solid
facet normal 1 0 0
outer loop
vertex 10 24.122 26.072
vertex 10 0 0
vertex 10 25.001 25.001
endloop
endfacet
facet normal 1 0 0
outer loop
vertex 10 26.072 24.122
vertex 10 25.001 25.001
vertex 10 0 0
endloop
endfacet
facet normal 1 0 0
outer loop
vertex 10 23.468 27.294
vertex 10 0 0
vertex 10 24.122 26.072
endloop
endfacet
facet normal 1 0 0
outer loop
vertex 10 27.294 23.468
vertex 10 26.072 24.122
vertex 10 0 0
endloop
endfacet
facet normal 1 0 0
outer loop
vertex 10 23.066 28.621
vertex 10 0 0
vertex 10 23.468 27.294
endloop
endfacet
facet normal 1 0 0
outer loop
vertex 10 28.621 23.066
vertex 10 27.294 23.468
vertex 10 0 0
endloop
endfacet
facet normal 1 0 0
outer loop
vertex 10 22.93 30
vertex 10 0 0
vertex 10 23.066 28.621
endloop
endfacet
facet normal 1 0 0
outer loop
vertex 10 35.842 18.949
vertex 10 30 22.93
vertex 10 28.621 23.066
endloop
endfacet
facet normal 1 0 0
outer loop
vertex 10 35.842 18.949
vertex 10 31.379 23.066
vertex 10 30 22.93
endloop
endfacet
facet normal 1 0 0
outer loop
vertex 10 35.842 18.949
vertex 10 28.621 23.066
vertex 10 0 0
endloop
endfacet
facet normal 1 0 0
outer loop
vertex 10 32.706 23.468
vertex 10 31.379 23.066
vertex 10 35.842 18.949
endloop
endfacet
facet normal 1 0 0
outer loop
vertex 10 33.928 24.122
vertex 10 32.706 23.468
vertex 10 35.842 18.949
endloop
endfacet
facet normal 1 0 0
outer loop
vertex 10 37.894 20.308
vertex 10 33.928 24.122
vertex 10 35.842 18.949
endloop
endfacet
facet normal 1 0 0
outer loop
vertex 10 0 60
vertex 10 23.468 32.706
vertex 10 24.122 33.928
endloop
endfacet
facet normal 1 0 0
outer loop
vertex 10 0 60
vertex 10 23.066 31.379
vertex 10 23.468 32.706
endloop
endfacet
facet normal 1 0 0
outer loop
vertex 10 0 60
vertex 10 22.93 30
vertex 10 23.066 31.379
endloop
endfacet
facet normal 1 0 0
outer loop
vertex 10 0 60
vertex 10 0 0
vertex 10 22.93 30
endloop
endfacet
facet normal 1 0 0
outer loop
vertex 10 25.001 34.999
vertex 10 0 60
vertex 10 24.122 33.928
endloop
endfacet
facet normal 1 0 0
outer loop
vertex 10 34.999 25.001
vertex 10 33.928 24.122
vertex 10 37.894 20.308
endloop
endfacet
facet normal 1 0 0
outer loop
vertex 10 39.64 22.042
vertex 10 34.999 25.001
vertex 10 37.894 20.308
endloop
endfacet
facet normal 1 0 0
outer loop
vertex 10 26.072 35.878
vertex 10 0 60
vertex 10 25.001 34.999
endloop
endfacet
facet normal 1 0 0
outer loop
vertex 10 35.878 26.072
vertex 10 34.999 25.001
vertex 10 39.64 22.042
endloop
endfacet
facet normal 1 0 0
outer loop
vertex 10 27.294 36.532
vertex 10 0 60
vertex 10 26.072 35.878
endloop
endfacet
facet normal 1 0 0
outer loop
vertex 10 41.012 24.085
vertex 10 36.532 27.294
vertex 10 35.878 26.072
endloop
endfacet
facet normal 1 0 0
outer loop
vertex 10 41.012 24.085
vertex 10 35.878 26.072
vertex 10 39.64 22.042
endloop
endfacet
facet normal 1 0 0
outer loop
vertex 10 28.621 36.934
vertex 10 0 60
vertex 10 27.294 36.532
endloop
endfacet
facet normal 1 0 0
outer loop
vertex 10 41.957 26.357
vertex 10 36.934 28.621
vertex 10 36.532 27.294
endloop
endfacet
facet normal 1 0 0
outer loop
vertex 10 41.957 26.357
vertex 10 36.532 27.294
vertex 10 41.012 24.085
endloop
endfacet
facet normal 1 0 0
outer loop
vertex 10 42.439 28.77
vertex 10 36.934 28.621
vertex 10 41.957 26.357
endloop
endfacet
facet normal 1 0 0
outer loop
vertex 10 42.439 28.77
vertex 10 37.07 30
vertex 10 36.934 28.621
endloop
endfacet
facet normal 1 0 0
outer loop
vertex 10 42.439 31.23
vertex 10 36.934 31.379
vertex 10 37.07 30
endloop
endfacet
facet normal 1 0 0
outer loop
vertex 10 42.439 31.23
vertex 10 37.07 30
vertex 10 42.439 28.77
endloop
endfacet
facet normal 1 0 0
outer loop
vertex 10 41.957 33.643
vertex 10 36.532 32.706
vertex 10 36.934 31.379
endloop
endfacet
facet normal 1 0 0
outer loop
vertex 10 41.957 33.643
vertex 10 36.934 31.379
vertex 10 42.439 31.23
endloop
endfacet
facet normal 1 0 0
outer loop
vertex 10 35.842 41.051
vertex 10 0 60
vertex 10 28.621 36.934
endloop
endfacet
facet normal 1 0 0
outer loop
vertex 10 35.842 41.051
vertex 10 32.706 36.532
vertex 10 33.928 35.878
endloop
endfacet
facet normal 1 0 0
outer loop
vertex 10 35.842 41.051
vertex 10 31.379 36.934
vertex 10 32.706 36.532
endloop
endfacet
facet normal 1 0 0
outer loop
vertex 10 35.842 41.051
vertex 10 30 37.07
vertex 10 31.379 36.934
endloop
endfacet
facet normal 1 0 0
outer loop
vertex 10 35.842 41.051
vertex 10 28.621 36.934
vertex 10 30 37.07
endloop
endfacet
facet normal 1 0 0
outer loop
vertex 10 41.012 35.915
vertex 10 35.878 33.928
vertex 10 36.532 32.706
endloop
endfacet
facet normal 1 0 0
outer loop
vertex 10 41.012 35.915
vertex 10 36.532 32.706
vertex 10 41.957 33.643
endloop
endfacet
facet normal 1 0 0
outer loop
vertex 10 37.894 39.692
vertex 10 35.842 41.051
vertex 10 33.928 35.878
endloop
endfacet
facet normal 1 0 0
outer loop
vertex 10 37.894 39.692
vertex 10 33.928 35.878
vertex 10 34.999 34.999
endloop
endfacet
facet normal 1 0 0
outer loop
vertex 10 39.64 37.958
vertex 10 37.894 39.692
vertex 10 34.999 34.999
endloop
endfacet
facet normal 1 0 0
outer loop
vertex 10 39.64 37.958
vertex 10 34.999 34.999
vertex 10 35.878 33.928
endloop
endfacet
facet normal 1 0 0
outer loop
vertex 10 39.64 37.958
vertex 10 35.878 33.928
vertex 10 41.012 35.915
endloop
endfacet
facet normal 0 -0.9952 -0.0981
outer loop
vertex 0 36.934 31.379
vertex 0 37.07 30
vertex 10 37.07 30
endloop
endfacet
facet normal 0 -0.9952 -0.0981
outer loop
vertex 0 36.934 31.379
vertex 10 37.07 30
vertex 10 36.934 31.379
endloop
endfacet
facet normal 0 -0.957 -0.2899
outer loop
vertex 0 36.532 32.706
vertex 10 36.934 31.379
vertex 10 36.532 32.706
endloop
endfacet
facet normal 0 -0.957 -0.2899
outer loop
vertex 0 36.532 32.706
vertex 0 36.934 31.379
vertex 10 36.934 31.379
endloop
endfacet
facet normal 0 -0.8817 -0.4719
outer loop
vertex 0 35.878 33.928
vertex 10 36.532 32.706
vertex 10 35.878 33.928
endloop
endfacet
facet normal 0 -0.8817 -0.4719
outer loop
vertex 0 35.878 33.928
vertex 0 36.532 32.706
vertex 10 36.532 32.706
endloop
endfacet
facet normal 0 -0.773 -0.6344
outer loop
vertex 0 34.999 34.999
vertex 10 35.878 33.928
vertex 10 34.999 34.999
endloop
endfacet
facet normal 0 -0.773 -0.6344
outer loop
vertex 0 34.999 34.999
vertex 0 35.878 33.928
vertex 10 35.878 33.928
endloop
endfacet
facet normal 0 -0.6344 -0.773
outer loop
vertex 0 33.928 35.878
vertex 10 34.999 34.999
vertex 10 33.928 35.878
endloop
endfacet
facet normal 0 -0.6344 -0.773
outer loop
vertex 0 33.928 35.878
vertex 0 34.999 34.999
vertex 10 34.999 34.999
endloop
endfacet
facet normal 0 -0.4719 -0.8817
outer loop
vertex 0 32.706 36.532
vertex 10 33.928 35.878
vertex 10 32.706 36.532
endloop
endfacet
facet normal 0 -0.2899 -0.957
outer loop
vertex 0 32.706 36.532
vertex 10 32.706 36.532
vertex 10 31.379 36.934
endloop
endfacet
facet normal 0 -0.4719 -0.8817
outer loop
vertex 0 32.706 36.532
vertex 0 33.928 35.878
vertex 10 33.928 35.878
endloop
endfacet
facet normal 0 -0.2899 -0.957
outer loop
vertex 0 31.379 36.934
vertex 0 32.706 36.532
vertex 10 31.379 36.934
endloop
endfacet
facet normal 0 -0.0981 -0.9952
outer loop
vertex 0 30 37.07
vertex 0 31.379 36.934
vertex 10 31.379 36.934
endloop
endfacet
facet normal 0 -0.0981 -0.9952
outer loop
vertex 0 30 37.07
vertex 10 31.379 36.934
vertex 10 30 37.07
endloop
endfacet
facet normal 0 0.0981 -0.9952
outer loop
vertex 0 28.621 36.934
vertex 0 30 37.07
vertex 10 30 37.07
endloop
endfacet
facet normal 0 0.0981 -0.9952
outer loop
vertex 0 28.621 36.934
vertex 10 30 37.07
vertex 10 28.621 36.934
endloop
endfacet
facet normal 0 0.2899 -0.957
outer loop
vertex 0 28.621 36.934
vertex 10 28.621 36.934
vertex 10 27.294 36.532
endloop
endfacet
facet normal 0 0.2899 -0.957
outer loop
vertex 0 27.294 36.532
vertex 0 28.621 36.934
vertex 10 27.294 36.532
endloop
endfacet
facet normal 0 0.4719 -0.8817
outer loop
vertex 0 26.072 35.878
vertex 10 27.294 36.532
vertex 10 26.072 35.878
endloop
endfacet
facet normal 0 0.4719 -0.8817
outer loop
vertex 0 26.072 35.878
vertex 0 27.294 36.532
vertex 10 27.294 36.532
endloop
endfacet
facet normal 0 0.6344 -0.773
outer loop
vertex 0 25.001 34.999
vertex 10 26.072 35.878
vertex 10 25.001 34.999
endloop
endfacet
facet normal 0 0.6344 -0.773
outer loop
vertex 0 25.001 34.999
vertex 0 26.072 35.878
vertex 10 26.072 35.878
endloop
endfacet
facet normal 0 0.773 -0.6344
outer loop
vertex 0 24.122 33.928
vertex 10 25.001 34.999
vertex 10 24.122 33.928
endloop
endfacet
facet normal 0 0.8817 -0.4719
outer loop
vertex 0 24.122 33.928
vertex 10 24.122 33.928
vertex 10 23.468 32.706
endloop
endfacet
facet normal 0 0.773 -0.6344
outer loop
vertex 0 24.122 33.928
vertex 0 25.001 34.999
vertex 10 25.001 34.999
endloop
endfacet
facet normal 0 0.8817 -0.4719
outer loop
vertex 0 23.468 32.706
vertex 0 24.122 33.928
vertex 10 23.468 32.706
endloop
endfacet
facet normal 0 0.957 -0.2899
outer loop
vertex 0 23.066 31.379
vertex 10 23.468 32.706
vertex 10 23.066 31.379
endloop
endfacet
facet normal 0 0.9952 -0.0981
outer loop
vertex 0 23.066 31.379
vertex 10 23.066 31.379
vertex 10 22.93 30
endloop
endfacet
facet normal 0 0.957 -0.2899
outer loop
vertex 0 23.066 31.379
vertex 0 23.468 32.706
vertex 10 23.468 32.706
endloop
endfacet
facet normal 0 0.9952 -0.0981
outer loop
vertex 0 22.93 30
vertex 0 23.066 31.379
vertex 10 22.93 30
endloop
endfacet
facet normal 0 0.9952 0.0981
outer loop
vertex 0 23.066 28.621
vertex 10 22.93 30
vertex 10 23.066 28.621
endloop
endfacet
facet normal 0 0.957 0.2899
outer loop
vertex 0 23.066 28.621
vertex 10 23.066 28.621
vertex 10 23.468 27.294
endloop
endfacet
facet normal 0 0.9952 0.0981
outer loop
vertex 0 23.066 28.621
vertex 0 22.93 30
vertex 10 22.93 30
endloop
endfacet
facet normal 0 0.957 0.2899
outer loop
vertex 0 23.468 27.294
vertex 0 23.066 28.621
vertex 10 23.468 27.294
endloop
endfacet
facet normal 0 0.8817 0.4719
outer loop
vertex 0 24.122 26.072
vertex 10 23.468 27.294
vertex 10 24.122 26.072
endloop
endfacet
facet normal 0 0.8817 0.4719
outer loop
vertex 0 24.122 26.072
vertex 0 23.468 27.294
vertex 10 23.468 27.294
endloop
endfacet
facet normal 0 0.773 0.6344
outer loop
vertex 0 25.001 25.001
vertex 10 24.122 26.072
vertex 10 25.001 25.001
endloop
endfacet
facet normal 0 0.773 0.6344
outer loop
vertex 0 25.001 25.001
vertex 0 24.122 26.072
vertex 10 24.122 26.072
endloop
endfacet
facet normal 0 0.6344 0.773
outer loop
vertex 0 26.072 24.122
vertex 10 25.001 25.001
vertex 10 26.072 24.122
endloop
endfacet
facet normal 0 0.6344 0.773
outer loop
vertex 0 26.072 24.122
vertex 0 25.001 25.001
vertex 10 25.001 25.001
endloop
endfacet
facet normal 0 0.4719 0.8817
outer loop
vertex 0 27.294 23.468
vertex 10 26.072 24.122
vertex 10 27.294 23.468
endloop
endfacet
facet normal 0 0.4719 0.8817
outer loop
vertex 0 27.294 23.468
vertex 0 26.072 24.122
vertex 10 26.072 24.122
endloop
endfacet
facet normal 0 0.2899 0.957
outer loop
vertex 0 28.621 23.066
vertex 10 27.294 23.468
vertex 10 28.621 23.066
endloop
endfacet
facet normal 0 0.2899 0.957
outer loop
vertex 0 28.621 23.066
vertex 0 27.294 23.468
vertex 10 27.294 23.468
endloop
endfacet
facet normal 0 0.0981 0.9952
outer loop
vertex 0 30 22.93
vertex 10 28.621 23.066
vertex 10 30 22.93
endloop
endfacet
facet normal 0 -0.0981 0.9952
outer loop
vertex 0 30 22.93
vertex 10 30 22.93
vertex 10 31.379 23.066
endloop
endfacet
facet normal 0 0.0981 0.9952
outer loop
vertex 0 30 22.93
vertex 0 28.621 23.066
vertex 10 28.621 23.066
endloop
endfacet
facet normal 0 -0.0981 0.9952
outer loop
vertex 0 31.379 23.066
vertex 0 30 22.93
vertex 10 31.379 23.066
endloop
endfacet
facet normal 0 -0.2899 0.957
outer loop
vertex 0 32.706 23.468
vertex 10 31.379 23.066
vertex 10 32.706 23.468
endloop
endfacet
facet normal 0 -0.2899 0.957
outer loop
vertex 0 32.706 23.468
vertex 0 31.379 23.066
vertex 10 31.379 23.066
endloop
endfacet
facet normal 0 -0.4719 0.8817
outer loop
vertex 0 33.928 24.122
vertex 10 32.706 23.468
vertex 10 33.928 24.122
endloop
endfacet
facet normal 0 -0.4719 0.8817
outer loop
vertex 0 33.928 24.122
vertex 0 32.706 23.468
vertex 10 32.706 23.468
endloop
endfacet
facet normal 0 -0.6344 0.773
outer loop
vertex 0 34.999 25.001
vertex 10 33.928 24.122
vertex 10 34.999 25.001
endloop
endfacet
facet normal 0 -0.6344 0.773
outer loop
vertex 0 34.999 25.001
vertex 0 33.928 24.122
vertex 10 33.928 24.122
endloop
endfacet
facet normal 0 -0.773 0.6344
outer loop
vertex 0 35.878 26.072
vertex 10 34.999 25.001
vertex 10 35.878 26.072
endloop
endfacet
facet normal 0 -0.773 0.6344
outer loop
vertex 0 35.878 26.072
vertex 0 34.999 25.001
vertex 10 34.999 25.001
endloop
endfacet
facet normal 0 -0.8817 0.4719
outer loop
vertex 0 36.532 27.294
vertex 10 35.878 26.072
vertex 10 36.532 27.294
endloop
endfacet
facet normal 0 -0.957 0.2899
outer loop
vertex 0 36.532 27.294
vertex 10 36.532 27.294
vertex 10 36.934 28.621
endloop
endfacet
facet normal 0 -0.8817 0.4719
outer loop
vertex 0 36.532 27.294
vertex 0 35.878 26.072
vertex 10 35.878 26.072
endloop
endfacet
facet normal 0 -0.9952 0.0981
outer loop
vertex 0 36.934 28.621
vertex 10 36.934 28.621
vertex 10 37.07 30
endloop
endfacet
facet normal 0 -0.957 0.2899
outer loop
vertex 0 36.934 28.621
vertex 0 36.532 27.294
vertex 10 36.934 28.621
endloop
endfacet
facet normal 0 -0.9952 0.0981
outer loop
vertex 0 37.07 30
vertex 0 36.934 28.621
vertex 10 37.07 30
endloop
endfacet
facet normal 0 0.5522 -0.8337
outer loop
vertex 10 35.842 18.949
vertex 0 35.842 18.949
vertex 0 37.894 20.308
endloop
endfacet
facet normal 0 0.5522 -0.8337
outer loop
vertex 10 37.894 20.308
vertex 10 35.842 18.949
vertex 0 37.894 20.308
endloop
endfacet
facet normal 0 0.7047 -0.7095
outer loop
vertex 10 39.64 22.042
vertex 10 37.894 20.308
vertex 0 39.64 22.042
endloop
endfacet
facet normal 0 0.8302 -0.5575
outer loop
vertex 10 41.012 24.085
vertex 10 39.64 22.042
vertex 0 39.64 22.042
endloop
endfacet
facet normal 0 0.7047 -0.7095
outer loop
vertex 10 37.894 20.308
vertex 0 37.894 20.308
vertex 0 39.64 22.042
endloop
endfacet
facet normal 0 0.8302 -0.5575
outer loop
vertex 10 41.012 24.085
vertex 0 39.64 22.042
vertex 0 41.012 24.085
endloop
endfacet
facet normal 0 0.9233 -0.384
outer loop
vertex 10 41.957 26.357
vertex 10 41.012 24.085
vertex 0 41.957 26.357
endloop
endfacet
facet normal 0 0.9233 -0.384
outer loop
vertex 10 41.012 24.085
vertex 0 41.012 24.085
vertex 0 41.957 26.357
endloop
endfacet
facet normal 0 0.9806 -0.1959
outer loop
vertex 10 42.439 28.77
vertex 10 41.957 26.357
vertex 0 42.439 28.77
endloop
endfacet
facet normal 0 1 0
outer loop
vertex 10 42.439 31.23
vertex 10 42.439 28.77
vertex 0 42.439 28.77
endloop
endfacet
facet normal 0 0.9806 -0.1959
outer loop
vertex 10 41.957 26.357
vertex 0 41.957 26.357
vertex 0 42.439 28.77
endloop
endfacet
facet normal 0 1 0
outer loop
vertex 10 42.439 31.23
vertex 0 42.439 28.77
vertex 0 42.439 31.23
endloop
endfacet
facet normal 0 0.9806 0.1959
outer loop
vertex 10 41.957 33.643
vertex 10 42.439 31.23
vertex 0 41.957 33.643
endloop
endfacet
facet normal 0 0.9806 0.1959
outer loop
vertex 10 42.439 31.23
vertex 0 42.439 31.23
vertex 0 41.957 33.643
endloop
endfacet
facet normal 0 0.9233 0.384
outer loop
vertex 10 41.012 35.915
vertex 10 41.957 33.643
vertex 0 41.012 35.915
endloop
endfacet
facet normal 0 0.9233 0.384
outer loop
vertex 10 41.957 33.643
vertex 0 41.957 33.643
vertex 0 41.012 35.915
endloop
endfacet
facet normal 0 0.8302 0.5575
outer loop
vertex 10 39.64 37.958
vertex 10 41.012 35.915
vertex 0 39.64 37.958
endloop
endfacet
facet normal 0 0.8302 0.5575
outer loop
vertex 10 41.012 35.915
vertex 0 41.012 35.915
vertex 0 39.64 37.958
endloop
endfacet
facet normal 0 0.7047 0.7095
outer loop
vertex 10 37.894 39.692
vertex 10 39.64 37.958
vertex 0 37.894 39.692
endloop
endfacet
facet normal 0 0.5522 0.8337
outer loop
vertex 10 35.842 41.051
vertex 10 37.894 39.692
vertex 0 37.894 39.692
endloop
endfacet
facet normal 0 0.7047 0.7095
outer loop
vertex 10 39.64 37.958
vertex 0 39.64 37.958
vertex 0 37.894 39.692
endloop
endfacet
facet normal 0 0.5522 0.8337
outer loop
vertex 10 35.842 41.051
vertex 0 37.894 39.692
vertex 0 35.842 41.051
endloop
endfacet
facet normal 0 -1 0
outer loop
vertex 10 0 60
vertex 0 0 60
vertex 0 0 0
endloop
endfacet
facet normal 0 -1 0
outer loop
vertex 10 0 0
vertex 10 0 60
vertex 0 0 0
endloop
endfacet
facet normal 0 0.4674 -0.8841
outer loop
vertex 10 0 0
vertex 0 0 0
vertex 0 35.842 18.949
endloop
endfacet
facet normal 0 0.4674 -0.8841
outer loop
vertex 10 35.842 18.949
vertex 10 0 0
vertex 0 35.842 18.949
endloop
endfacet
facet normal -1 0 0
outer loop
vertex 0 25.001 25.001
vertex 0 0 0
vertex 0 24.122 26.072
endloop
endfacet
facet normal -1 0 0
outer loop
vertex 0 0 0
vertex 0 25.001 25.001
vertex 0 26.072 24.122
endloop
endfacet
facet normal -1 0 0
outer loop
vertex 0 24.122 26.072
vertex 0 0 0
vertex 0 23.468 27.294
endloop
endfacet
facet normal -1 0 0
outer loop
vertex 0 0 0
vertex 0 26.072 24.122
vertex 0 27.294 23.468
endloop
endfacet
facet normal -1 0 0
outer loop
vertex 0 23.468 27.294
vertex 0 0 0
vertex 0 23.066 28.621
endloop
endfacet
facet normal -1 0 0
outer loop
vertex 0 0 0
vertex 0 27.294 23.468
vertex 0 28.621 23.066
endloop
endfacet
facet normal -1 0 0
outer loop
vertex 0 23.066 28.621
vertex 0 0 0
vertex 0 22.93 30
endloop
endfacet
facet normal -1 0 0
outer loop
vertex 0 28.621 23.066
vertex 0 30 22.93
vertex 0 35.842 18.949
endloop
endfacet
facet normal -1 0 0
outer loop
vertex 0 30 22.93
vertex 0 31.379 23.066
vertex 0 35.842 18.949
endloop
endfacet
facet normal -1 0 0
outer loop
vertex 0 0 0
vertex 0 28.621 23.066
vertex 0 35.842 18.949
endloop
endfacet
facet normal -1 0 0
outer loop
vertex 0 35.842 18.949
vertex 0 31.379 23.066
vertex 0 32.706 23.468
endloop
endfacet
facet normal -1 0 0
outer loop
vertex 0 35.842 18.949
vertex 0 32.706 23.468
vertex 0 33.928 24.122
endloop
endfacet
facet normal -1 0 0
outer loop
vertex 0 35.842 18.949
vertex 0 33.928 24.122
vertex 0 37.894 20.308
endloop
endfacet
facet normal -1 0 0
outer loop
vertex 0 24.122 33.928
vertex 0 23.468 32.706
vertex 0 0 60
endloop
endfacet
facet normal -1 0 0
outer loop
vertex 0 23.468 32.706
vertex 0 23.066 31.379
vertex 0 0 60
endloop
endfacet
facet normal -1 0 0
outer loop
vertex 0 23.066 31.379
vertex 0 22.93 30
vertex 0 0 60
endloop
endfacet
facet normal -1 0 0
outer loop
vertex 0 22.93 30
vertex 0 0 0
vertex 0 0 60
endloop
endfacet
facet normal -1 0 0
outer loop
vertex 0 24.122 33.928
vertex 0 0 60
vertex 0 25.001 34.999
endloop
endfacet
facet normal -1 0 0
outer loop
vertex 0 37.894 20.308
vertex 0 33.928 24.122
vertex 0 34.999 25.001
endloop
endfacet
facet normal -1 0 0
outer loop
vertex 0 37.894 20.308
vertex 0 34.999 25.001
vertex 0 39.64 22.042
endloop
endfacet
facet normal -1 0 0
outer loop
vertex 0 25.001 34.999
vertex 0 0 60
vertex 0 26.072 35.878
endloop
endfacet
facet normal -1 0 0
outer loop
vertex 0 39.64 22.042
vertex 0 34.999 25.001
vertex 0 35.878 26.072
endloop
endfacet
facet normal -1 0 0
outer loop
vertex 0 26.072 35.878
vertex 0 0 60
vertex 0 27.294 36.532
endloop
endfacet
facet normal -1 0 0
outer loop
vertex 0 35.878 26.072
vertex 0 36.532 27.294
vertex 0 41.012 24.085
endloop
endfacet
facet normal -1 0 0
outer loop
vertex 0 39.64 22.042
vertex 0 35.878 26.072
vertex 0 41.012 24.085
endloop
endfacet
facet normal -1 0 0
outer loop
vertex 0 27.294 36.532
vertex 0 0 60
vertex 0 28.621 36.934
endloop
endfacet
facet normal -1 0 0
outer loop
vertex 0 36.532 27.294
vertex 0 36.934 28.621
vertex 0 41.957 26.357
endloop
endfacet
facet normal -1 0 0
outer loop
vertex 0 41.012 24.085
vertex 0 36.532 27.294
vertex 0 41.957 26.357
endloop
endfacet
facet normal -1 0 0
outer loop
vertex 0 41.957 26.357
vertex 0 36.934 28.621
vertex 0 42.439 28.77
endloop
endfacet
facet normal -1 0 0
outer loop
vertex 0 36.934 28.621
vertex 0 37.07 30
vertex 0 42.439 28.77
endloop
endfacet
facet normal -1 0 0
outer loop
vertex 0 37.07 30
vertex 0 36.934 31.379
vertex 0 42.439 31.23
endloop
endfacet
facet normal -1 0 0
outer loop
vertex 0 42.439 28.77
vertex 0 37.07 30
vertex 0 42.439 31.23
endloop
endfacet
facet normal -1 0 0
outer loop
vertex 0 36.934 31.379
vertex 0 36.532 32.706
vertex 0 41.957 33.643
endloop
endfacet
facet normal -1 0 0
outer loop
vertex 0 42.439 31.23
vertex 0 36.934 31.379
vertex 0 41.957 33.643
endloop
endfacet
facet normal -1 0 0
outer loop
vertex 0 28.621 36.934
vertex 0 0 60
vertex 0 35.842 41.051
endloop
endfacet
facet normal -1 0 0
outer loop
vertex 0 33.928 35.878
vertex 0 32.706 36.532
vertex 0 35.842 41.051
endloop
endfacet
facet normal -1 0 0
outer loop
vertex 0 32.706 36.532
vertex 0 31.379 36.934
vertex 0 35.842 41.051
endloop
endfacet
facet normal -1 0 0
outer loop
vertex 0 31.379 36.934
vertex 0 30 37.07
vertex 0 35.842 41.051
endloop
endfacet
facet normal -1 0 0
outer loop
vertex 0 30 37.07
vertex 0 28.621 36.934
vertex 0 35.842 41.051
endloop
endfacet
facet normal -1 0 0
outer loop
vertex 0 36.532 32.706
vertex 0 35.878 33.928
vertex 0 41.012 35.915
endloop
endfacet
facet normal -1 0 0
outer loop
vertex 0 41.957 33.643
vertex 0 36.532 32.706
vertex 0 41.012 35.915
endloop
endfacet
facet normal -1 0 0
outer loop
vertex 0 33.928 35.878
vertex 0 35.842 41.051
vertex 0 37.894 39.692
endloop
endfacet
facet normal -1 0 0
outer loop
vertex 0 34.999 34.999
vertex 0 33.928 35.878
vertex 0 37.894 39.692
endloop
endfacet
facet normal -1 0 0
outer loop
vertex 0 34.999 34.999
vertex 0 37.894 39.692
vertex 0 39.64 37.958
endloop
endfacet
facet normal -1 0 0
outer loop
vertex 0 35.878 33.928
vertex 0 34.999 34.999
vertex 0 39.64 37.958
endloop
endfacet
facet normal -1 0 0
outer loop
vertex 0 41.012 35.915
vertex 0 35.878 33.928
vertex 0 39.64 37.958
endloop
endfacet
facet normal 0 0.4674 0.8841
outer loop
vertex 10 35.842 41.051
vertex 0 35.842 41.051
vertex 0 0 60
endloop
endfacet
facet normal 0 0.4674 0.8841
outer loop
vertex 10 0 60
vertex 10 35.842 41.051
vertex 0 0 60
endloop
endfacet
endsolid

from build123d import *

# Parameters (mm, degrees)
F0_R     = 7.07
F1_DEPTH = 10


with BuildPart() as f1:
    # F0 (on Right) → F1 (new body)
    with BuildSketch(Plane.YZ):
        with BuildLine():
            Line((0, 60), (0, 0))
            Line((0, 0), (35.842331, 18.949336))
            ThreePointArc((35.842331, 18.949336), (42.5, 30), (35.842331, 41.050664))
            Line((35.842331, 41.050664), (0, 60))
        make_face()
        with Locations((30, 30)):
            Circle(F0_R, mode=Mode.SUBTRACT)
    extrude(amount=F1_DEPTH)


solid = f1.part
